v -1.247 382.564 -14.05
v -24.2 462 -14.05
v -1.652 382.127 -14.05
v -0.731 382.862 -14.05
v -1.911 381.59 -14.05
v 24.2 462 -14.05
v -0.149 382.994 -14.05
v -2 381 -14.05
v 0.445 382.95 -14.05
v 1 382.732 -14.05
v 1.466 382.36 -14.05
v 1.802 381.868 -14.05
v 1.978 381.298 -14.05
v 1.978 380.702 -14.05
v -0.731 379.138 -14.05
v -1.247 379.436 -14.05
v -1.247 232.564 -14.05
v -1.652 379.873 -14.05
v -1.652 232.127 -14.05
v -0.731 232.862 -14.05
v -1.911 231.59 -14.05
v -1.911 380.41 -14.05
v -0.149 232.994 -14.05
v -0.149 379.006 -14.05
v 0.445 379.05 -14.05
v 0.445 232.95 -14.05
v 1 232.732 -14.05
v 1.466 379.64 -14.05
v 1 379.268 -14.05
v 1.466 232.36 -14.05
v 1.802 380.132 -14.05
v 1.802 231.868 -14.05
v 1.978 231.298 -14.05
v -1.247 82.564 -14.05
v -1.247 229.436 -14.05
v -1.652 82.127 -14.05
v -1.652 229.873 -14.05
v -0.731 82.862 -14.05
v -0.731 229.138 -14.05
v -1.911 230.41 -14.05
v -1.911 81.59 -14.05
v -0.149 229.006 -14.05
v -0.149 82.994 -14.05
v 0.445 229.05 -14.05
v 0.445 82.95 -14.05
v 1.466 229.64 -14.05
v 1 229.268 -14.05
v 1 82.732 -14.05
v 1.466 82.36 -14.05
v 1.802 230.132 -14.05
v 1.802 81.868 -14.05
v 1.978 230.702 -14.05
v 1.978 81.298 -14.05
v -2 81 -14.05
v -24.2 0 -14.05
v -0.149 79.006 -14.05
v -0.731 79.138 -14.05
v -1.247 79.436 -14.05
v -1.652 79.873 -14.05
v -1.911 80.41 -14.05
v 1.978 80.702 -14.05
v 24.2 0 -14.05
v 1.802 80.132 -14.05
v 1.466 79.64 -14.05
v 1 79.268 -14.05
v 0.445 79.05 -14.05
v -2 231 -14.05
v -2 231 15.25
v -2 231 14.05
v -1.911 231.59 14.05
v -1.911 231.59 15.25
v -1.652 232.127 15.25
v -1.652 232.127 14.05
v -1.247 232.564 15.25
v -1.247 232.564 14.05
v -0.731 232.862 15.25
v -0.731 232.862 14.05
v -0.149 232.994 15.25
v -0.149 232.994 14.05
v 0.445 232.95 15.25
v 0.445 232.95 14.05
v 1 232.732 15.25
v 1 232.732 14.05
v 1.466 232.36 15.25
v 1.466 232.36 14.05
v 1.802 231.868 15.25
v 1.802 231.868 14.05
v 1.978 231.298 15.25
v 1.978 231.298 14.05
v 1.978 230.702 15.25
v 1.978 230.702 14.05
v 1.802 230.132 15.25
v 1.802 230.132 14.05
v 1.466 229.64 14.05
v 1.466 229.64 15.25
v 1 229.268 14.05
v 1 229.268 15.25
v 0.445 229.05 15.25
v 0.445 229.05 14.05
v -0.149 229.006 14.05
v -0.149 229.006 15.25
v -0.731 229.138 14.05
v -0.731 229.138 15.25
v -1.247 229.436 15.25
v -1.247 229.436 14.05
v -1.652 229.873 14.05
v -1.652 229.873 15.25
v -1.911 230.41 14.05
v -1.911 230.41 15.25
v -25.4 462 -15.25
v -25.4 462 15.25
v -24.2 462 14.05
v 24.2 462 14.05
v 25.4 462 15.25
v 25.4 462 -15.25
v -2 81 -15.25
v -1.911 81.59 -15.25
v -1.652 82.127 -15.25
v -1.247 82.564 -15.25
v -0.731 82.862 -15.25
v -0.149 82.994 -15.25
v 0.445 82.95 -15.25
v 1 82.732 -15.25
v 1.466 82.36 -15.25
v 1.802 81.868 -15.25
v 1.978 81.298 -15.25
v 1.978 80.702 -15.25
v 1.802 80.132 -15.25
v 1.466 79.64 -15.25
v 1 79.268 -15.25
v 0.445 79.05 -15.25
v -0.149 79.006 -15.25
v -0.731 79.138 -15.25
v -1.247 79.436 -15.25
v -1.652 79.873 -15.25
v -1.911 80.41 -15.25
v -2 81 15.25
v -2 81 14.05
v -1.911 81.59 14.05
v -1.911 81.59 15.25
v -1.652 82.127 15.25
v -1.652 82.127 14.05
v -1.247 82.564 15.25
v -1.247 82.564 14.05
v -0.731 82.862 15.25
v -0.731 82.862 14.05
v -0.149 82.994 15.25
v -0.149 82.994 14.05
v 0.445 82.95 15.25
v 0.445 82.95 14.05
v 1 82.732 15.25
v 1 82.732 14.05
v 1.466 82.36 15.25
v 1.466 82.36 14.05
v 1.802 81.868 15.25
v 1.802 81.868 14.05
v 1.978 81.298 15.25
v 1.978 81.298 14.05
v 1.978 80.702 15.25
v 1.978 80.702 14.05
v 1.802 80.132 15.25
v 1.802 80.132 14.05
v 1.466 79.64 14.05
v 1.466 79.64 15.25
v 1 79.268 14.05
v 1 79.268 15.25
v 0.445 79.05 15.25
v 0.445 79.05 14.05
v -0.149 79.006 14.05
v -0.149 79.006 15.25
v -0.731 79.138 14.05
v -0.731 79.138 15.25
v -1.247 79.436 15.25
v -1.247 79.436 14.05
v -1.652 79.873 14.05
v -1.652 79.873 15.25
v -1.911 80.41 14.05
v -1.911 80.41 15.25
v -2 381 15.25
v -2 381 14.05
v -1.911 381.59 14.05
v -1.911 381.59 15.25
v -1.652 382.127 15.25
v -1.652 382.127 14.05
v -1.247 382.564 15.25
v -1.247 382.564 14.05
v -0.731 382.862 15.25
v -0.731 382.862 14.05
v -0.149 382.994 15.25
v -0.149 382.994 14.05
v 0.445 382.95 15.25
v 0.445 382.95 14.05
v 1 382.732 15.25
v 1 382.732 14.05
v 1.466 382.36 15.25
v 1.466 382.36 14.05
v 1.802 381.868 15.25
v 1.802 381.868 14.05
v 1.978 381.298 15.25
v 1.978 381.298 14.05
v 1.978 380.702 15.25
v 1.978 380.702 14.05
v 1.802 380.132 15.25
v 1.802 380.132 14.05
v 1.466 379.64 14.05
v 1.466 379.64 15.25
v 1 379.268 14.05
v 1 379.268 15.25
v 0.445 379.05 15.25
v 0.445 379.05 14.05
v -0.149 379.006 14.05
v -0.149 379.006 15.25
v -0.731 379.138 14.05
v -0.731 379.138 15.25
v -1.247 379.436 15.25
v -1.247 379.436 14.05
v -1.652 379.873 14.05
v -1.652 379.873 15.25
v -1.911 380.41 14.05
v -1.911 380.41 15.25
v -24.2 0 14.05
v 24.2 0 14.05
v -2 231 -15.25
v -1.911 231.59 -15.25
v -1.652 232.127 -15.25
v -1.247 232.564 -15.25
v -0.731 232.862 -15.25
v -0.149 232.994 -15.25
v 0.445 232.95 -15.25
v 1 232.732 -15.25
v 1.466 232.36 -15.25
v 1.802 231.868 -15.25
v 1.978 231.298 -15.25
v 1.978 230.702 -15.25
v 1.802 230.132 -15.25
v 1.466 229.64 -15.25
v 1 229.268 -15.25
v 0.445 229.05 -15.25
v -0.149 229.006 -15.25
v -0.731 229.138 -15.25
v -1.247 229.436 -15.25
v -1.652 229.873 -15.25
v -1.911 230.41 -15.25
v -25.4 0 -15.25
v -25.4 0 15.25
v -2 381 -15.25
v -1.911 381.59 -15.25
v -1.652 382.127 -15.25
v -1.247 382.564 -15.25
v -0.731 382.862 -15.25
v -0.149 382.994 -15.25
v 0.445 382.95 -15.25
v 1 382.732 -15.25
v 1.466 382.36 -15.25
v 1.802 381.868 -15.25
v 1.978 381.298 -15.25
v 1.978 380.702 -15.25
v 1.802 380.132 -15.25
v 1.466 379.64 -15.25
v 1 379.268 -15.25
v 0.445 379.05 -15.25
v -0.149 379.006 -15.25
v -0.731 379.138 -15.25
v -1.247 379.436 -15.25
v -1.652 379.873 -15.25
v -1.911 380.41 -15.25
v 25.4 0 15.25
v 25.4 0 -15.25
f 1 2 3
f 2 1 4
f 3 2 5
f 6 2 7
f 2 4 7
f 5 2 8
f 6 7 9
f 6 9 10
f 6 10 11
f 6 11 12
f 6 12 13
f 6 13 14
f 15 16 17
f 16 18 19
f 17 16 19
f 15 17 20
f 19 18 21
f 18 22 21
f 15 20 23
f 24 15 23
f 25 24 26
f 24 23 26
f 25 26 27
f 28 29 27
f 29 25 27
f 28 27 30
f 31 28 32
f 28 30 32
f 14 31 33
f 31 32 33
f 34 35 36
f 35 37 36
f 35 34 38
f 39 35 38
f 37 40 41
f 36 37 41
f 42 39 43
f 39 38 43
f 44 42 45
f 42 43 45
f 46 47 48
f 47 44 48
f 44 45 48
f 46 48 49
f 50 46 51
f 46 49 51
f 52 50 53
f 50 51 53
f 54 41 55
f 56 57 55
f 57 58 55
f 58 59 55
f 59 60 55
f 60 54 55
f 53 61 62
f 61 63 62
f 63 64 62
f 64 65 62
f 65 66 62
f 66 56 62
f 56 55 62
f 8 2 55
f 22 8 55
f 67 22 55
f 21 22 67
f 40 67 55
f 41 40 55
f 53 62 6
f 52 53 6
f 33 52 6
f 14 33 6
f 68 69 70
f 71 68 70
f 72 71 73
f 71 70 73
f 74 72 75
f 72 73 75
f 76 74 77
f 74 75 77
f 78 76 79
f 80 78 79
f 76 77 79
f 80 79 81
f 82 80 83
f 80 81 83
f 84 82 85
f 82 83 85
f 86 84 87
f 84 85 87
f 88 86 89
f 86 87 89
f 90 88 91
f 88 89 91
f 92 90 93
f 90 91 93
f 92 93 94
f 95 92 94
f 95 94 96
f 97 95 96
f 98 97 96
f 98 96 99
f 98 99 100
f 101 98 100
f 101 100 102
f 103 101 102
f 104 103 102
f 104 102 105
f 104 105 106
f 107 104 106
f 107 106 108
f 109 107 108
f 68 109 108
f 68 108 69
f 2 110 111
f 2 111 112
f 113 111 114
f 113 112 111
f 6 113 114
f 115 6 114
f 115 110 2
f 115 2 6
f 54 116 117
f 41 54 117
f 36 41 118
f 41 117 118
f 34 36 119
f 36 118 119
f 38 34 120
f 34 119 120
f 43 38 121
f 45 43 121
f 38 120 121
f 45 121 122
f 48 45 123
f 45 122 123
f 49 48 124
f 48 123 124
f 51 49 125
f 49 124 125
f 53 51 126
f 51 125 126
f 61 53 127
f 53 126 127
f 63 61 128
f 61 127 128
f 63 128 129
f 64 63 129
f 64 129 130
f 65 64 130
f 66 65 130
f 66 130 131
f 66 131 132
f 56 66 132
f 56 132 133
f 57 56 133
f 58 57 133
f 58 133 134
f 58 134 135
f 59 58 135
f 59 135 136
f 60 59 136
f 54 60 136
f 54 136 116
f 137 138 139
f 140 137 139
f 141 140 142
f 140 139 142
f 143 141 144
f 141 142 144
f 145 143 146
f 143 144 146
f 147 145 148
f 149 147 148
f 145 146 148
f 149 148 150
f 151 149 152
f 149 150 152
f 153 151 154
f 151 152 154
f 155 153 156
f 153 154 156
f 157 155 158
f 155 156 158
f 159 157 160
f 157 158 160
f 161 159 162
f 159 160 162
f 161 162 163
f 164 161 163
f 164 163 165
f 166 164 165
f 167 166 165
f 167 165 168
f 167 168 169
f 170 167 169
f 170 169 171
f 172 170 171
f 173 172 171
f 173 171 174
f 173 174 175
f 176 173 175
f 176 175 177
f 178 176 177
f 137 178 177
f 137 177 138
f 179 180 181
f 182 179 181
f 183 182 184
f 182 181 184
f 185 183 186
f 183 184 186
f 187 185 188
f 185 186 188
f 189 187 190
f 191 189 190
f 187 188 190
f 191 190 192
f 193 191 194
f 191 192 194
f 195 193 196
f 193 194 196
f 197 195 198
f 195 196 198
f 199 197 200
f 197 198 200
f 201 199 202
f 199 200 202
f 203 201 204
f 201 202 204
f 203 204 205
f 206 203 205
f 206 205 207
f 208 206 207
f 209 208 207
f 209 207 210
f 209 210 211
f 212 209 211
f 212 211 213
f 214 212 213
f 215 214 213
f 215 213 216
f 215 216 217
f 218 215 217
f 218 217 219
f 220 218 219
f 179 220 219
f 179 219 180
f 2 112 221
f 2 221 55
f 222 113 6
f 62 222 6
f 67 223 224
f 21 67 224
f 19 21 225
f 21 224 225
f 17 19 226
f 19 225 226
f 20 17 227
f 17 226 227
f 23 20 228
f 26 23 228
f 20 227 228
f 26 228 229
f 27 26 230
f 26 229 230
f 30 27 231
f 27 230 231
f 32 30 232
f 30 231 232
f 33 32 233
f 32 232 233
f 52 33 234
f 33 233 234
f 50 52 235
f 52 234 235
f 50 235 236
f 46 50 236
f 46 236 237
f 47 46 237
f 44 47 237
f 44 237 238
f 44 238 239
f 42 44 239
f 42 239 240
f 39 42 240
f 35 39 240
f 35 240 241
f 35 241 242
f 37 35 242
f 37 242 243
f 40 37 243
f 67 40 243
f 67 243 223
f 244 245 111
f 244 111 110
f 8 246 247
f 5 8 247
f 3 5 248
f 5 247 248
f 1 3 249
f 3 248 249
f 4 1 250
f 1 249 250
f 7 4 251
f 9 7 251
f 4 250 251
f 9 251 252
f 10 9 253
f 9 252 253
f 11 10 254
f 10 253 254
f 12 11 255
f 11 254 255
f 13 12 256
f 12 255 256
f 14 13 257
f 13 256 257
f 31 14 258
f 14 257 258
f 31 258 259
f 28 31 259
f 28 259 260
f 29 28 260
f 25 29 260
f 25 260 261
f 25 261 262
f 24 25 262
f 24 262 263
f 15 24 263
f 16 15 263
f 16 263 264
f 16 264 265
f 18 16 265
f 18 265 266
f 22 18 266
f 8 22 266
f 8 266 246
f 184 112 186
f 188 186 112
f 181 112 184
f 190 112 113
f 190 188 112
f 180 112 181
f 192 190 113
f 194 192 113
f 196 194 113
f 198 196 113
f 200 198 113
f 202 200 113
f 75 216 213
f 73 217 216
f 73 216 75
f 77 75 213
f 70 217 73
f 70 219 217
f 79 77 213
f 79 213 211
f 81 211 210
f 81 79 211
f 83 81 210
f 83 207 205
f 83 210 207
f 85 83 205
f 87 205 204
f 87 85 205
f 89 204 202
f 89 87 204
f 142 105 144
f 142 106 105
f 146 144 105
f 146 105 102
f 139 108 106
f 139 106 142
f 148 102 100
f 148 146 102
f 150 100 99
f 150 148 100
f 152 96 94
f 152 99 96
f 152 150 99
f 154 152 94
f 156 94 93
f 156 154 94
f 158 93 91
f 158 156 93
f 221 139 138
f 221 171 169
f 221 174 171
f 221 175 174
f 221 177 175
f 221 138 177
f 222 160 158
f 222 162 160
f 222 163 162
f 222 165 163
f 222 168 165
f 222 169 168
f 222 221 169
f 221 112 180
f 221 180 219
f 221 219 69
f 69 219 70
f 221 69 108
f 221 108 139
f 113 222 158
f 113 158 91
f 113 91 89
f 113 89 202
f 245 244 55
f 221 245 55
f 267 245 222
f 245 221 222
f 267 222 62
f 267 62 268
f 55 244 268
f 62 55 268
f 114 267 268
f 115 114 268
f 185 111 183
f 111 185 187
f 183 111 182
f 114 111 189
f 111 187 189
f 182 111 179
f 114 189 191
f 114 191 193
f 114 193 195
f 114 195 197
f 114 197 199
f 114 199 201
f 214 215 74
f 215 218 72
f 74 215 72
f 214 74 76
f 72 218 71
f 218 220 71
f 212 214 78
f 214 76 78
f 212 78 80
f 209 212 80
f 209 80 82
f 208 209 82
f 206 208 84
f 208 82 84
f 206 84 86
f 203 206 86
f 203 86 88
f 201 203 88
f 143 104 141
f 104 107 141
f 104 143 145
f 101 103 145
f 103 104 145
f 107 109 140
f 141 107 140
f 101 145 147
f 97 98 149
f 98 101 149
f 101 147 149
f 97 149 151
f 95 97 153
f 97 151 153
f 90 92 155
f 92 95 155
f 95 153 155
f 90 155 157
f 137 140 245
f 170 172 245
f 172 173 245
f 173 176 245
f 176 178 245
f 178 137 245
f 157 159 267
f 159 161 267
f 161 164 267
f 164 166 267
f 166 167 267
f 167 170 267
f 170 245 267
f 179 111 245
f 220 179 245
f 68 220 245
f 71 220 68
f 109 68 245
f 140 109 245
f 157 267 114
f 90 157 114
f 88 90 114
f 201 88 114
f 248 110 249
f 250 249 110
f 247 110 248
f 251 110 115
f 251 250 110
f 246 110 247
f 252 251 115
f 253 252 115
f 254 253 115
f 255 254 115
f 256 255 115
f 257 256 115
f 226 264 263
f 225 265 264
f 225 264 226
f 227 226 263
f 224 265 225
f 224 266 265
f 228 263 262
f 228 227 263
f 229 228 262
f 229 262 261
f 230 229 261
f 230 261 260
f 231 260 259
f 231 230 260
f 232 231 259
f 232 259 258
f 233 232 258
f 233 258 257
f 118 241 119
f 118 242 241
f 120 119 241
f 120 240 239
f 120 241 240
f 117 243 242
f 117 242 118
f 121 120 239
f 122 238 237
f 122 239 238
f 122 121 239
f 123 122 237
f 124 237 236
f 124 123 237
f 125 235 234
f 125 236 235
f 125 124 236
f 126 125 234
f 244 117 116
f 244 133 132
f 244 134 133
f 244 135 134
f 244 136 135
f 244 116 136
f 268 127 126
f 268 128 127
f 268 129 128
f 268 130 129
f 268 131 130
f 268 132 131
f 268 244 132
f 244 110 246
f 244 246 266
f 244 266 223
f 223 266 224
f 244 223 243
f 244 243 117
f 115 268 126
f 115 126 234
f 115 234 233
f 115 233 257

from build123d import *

# Parameters (mm, degrees)
SKETCH1_W           = 50.8
SKETCH1_H           = 30.5
SKETCH1_W_2         = 48.4
SKETCH1_H_2         = 28.1
BOSS_EXTRUDE1_DEPTH = 462
SKETCH2_R           = 2
CUT_EXTRUDE1_DEPTH  = 464.701854644


with BuildPart() as part:
    # Sketch1 → Boss-Extrude1 (new body)
    with BuildSketch(Plane(origin=(0, 0, 0), x_dir=(1, 0, 0), z_dir=(0, 1, 0))):
        Rectangle(SKETCH1_W, SKETCH1_H)
        Rectangle(SKETCH1_W_2, SKETCH1_H_2, mode=Mode.SUBTRACT)
    extrude(amount=BOSS_EXTRUDE1_DEPTH)

    # Sketch2 → Cut-Extrude1 (cut, through all)
    with BuildSketch(Plane(origin=(0, 0, -15.25), x_dir=(-1, 0, 0), z_dir=(0, 0, -1))):
        with Locations((0, 231)):
            Circle(SKETCH2_R)
        with Locations((0, 381)):
            Circle(SKETCH2_R)
        with Locations((0, 81)):
            Circle(SKETCH2_R)
    extrude(amount=-CUT_EXTRUDE1_DEPTH, mode=Mode.SUBTRACT)


solid = part.part
